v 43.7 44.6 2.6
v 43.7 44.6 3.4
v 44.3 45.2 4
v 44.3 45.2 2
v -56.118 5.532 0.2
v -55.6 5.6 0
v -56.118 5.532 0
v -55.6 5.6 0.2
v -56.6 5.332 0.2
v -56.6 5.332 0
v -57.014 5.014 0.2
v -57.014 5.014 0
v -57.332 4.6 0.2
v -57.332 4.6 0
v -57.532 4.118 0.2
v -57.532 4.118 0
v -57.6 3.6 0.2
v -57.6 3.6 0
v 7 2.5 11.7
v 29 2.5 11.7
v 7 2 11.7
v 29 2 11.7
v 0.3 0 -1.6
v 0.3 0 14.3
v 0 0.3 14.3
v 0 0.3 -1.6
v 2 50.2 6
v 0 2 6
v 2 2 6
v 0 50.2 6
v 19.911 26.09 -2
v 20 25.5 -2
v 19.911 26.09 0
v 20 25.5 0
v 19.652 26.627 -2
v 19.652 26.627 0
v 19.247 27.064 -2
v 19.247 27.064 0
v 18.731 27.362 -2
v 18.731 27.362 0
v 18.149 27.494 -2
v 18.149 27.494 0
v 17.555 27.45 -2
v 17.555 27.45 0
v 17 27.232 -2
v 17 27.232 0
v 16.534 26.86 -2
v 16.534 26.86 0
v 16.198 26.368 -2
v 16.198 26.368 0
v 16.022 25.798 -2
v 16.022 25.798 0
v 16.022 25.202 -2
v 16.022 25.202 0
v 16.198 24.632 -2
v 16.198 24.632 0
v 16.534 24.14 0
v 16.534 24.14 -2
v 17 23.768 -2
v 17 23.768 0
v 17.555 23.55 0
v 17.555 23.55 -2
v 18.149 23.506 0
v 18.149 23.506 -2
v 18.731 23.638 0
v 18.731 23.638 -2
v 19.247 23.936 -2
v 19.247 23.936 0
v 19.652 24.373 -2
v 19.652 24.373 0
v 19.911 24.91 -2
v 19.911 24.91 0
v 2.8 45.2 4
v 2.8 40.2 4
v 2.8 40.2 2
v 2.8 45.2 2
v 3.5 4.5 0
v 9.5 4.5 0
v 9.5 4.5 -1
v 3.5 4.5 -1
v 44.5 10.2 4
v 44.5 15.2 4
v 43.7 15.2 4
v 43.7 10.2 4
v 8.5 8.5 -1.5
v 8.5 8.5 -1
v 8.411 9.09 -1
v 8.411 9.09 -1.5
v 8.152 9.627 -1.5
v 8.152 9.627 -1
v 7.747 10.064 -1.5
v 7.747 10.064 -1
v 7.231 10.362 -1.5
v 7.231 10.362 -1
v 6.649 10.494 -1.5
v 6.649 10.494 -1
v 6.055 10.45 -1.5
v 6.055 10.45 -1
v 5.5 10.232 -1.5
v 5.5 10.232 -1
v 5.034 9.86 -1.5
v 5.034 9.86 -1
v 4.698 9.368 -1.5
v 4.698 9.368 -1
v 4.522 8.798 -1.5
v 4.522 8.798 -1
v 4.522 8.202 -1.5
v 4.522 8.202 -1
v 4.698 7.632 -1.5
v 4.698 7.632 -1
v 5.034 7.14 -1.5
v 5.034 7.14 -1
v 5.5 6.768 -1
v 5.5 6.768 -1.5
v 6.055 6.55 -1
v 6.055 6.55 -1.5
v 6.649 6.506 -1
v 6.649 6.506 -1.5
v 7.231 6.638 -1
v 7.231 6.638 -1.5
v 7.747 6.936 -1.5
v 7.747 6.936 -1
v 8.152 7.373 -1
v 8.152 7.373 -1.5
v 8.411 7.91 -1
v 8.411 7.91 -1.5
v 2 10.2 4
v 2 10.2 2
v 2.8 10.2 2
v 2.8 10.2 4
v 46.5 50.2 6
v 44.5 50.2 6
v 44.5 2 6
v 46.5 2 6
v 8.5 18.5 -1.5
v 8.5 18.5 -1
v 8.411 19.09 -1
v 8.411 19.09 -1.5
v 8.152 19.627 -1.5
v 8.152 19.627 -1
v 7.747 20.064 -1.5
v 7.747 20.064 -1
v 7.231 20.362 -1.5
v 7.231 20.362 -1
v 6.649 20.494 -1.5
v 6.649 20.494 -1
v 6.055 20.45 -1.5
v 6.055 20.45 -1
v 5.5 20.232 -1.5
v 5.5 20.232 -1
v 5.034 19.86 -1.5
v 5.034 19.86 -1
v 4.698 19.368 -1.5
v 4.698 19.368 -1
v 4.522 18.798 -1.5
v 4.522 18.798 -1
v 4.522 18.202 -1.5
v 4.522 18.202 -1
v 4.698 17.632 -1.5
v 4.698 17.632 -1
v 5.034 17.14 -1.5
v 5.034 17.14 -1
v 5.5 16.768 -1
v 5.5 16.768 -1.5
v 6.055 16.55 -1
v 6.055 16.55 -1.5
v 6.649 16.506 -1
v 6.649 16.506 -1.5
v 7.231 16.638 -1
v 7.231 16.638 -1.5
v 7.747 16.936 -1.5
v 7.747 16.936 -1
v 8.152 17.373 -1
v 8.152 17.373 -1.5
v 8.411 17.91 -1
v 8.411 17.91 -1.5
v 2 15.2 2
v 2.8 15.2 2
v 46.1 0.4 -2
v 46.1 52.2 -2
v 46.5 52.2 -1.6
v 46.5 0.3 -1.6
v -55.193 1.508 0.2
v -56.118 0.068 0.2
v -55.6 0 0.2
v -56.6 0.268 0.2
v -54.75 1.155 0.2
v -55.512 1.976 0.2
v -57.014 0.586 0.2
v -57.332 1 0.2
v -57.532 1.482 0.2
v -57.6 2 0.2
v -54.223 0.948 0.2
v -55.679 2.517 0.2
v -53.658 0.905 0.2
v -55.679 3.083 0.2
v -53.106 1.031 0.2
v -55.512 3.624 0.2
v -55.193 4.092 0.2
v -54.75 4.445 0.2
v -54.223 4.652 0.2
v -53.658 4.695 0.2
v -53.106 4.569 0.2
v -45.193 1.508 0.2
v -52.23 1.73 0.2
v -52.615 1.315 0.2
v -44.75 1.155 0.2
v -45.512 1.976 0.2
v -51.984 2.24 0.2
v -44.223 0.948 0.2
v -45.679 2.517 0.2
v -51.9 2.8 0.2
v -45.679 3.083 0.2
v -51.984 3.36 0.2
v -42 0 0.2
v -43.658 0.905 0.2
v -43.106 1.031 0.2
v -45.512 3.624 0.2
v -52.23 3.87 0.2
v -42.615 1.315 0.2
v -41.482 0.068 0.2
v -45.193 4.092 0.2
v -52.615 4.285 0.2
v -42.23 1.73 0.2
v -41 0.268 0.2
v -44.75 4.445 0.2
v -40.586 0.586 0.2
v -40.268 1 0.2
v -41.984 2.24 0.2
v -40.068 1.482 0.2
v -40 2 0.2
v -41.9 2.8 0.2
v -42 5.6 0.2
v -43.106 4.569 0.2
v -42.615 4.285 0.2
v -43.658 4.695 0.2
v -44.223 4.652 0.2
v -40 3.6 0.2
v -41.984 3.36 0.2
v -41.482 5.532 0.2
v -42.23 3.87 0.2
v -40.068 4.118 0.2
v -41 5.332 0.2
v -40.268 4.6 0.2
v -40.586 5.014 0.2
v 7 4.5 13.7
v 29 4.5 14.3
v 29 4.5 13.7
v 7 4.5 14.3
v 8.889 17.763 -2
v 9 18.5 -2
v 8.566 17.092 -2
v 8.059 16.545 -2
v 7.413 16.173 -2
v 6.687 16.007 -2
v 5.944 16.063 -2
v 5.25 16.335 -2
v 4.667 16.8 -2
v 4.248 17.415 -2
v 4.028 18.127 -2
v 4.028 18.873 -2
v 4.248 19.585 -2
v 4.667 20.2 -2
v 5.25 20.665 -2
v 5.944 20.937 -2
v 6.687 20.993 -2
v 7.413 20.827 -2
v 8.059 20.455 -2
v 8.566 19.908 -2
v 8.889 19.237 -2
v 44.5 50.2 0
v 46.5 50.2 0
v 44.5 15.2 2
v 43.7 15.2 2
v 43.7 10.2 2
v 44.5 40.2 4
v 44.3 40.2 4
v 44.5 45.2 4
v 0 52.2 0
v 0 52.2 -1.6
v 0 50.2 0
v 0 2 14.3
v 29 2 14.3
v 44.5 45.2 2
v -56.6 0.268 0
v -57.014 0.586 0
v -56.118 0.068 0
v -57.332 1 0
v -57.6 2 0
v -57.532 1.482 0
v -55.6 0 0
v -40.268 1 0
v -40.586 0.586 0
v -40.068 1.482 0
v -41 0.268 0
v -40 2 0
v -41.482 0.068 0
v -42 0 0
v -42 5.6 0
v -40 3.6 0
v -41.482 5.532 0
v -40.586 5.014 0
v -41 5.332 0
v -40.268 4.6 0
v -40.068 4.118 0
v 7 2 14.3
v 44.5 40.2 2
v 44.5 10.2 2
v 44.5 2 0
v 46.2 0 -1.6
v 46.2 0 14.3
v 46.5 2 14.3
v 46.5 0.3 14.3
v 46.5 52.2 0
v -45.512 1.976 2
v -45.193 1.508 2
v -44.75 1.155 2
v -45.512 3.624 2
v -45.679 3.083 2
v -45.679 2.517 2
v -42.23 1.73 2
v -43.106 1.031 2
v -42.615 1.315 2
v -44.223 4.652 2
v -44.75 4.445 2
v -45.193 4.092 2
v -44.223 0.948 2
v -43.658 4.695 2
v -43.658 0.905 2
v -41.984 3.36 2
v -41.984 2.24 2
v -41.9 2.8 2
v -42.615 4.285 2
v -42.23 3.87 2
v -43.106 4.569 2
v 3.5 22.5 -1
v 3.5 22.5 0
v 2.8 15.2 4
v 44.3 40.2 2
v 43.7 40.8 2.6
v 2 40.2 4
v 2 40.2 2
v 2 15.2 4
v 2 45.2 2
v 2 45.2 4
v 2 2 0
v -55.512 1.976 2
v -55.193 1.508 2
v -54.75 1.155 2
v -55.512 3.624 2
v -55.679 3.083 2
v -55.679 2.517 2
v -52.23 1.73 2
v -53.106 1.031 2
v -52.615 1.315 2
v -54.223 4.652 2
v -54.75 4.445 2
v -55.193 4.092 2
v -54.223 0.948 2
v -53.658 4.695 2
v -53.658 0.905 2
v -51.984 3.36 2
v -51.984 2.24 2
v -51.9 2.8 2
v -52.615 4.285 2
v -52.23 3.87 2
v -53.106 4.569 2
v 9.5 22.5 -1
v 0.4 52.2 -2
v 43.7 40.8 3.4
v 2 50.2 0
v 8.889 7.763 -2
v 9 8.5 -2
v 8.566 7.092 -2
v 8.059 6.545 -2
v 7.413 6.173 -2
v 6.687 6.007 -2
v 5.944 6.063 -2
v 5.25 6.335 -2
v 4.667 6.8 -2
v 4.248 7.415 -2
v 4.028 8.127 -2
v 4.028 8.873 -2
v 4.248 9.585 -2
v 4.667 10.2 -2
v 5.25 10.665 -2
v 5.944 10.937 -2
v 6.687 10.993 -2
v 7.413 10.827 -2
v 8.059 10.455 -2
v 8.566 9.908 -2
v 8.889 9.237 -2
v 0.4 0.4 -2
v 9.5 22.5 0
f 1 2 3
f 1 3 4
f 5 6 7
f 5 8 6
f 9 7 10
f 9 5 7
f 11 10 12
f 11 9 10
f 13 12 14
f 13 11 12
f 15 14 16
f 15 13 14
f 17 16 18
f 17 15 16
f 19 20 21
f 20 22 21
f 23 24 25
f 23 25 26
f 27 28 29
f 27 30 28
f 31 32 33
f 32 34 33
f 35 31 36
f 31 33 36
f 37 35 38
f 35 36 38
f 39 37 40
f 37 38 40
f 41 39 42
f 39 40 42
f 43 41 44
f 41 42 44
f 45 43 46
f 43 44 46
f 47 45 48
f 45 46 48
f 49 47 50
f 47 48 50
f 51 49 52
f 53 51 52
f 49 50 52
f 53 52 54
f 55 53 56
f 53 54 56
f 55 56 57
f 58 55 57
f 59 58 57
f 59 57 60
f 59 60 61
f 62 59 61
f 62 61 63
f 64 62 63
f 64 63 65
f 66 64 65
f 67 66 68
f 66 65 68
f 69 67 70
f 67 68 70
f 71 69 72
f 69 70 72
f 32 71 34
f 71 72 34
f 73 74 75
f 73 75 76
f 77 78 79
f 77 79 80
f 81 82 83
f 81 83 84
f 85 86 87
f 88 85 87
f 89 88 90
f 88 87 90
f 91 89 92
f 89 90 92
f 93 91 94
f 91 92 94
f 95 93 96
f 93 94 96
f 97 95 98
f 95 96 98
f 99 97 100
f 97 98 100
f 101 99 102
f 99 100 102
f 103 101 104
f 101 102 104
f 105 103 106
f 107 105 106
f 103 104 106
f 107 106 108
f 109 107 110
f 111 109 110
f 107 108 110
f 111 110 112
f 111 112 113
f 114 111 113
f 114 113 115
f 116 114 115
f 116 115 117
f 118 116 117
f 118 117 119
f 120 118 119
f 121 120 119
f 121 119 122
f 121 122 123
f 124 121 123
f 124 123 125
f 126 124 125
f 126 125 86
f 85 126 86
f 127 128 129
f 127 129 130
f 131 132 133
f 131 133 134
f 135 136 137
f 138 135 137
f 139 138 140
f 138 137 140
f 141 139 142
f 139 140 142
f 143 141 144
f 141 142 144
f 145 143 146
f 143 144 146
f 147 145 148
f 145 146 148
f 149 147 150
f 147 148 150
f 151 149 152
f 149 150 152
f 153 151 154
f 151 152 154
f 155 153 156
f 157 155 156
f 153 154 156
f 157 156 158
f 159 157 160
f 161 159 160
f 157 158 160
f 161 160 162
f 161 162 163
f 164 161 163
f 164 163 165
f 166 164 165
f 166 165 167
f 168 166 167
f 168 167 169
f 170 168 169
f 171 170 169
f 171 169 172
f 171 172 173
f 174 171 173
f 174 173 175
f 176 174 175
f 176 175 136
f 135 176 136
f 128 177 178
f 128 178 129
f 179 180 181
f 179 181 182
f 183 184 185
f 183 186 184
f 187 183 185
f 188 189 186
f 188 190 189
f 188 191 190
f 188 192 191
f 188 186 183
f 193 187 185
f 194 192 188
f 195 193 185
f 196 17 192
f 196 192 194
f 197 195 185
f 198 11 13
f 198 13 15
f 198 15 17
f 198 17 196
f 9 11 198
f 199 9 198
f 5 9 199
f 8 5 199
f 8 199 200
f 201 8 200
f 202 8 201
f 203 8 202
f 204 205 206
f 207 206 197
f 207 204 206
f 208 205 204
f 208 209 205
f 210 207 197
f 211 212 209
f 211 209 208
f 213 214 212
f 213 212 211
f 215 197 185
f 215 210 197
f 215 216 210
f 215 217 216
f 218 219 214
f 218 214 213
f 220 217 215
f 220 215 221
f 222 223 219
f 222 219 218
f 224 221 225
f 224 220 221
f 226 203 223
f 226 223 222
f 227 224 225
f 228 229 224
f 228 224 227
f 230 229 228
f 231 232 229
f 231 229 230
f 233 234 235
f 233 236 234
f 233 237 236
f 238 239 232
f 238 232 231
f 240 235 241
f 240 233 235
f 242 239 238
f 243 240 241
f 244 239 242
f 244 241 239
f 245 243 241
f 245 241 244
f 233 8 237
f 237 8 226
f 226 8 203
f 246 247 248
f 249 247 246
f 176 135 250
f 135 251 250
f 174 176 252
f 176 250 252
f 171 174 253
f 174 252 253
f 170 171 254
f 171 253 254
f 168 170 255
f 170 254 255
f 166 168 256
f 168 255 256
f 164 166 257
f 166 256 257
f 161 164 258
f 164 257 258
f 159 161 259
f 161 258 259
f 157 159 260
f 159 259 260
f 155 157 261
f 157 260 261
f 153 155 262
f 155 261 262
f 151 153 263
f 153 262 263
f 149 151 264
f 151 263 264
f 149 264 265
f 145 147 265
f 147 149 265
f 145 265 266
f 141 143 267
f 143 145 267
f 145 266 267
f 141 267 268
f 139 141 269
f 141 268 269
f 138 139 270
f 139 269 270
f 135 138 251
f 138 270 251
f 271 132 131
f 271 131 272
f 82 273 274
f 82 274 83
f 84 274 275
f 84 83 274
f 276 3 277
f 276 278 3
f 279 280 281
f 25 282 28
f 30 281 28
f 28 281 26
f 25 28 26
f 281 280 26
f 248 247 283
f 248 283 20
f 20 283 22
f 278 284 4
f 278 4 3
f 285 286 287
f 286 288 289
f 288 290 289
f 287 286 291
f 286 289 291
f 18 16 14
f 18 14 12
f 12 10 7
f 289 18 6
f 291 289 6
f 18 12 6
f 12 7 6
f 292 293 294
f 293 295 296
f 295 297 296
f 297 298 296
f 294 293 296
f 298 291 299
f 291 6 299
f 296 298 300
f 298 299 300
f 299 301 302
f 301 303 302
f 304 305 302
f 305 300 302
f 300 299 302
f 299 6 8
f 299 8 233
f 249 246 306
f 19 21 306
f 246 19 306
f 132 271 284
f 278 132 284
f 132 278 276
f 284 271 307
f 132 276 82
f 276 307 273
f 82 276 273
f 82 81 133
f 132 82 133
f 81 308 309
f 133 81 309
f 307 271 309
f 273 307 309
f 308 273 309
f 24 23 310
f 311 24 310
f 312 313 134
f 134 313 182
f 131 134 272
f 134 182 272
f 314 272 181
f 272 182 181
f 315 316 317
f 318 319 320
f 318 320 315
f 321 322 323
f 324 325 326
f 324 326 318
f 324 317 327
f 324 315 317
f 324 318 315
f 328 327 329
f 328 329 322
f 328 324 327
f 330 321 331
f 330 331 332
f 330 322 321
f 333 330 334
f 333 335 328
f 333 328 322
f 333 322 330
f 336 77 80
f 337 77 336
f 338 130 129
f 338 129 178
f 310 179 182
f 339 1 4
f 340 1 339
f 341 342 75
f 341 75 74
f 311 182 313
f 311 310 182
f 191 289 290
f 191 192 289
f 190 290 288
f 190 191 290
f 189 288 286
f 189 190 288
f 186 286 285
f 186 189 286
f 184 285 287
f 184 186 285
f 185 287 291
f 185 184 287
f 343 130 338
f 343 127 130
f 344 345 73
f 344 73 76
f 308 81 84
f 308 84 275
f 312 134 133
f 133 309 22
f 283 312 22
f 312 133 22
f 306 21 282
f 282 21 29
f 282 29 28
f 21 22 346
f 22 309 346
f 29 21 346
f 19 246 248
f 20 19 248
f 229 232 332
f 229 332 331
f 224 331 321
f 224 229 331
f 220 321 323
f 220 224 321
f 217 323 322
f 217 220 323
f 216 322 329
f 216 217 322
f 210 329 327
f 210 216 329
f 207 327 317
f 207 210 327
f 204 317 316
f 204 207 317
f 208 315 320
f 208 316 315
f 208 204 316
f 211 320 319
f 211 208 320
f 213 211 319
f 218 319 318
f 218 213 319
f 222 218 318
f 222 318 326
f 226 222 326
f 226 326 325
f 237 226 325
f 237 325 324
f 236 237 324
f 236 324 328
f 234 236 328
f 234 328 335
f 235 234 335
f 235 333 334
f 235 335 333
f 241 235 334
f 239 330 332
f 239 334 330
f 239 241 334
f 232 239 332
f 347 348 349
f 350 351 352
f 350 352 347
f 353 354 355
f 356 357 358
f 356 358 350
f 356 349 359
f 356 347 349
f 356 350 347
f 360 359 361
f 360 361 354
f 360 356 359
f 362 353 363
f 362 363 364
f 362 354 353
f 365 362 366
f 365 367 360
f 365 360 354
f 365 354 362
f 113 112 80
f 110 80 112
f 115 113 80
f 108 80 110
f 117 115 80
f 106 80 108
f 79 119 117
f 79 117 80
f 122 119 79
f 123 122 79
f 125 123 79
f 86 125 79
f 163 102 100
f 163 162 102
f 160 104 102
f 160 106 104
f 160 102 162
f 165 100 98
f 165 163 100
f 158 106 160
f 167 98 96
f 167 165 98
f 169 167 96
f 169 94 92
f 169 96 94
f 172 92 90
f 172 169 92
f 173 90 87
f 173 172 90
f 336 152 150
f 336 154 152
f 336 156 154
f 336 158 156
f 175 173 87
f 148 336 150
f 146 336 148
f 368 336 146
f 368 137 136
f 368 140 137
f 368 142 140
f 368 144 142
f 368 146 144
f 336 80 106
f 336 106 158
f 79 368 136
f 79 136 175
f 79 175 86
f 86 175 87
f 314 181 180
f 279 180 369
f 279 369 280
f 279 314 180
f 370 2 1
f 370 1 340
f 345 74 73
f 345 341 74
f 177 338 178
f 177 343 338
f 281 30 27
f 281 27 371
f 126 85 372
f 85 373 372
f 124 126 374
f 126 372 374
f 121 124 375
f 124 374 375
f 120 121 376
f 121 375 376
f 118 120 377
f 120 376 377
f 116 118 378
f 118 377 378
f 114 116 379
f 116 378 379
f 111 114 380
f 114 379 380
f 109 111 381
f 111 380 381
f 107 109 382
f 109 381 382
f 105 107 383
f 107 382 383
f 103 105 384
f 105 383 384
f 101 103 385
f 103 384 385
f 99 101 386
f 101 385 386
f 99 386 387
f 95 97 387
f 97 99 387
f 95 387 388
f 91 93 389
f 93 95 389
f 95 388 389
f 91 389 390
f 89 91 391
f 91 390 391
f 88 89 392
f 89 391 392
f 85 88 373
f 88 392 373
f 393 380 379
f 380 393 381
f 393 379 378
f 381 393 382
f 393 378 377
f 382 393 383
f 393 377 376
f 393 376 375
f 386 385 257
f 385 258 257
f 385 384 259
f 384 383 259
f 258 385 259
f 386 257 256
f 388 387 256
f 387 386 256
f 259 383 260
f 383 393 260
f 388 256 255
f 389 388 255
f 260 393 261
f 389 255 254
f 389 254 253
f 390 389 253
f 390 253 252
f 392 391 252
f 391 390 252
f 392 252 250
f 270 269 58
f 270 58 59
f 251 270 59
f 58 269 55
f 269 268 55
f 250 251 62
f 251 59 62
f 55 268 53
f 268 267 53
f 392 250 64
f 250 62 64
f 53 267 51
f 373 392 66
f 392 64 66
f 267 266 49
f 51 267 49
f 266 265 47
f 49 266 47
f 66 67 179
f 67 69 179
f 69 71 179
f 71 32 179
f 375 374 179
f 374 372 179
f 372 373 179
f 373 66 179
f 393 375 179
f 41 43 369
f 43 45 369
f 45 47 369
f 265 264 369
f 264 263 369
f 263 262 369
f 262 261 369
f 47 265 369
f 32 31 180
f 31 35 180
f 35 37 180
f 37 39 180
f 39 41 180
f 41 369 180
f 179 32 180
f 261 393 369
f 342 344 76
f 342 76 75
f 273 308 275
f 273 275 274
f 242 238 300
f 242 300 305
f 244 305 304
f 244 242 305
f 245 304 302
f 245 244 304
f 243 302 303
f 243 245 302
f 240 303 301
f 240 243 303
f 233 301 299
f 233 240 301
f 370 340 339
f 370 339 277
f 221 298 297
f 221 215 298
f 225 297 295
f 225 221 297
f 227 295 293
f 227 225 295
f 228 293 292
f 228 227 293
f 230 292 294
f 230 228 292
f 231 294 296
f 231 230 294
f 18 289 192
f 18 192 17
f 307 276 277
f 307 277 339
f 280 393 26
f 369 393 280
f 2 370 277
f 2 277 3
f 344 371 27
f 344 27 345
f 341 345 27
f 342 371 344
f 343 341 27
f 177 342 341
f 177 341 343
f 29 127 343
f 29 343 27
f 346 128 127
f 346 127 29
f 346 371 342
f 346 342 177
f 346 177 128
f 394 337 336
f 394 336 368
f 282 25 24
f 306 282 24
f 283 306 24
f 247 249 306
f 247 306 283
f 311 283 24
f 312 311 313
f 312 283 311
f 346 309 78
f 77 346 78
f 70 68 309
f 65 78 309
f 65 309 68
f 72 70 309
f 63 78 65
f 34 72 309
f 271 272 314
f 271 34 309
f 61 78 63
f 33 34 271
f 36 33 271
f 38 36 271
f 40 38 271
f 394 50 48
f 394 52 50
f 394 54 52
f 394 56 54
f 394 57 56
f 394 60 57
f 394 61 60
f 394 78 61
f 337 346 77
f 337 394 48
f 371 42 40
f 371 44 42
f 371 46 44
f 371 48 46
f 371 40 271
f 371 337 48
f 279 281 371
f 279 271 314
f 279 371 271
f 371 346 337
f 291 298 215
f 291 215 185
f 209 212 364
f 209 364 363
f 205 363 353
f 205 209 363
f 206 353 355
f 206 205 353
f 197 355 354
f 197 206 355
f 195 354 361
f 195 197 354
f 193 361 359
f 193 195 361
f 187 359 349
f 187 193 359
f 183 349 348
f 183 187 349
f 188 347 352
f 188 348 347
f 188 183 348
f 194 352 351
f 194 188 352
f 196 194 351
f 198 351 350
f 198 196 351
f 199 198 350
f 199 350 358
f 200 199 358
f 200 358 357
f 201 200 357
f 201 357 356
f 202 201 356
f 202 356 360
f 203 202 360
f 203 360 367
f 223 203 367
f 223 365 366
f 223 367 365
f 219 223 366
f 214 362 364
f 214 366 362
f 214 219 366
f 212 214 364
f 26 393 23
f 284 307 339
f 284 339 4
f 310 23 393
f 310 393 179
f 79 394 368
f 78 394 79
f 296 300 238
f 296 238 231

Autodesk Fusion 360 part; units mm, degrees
sketch "Sketch1" plane through (0, 0, 0) normal (0, 0, 1) x (1, 0, 0)
  line L0 (0, 0) -> (46.5, 0)
  line L1 (46.5, 0) -> (46.5, 52.2)
  line L2 (46.5, 52.2) -> (0, 52.2)
  line L3 (0, 52.2) -> (0, 0)
  line L4 (46.5, 2) -> (0, 2)
  line L5 (44.5, 52.2) -> (44.5, 2)
  line L6 (2, 52.2) -> (2, 2)
  circle A0 centre (6.5, 8.5) radius 2
  circle A1 centre (6.5, 18.5) radius 2
  line L7 (3.5, 22.5) -> (9.5, 22.5)
  line L8 (9.5, 22.5) -> (9.5, 4.5)
  line L9 (9.5, 4.5) -> (3.5, 4.5)
  line L10 (3.5, 4.5) -> (3.5, 22.5)
  circle A2 centre (18, 25.5) radius 2
  dimension "d1" = 46.5
  dimension "d2" = 52.2
  dimension "d3" = 2
  dimension "d4" = 2
  dimension "d5" = 2
  dimension "d55" = 6.5
  dimension "d56" = 6.5
  dimension "d57" = 4
  dimension "d58" = 4
  dimension "d59" = 6.5
  dimension "d60" = 10
  dimension "d61" = 4
  dimension "d62" = 4
  dimension "d63" = 3
  dimension "d64" = 3
  dimension "d70" = 23.5
  dimension "d72" = 18
  dimension "d73" = 4
extrude "Extrude1" add sketch "Sketch1" against normal blind 2 contours L0 L1 L3 L4 | L2 L3 L4 L6 | L1 L2 L4 L5 | L2 L4 L5 L6 | A0 | A1 | L7 L8 L9 L10 | A2 makes body 1
extrude "Extrude2" add sketch "Sketch1" along normal blind 6 contours L2 L3 L4 L6 | L1 L2 L4 L5 bodies 1
extrude "Extrude3" add sketch "Sketch1" along normal blind 14.3 contours L0 L1 L3 L4 bodies 1
sketch "Sketch2" plane through (0, 0, 0) normal (-1, 0, 0) x (0, -1, 0)
  line L0 (-52.2, 6) -> (-52.2, -2)
  line L1 (-52.2, -2) -> (0, -2)
  line L2 (0, -2) -> (0, 14.3)
  line L3 (0, 14.3) -> (-2, 14.3)
  line L4 (-2, 14.3) -> (-2, 6)
  line L5 (-2, 6) -> (-52.2, 6)
  line L6 (-52.2, 6) -> (-50.2, 6)
  line L7 (-50.2, 6) -> (-50.2, 0)
  line L8 (-50.2, 0) -> (-52.2, 0)
  line L9 (-52.2, 0) -> (-52.2, 6)
  line L10 (-52.2, 0) -> (0, 0)
  dimension "d12" = 2
extrude "Extrude4" cut sketch "Sketch2" against normal up to surface (46.5 mm away) contours L0 L5 L6 L7 L8 L9 L10 bodies 1
sketch "Sketch3" plane through (44.5, 0, 0) normal (-1, 0, 0) x (0, -1, 0)
  line L0 (-50.2, 6) -> (-50.2, 0)
  line L1 (-50.2, 0) -> (-2, 0)
  line L2 (-2, 0) -> (-2, 6)
  line L3 (-2, 6) -> (-50.2, 6)
  line L4 (-45.2, 4) -> (-40.2, 4)
  line L5 (-40.2, 4) -> (-40.2, 2)
  line L6 (-40.2, 2) -> (-45.2, 2)
  line L7 (-45.2, 2) -> (-45.2, 4)
  dimension "d15" = 2
  dimension "d16" = 5
  dimension "d17" = 2
  dimension "d18" = 5
extrude "Extrude5" add sketch "Sketch3" along normal blind 0.8 contours L4 L5 L6 L7 bodies 1
pattern_linear "R-Pattern1" count 2 spacing 30 along (0, -1, 0) of "Extrude5"
ref_plane "WorkPlane1" through (23.25, 27.1, 3) normal (-1, 0, 0) x (0, -1, 0)
mirror "Mirror1" about plane through (23.25, 27.1, 3) normal (-1, 0, 0) of "Extrude5", "R-Pattern1"
chamfer "Chamfer1" distance 0.6 angle 45 4 faces at (43.7, 43.5333, 3.3333) (43.7, 43.5333, 3.3333) (43.7, 43.5333, 3.3333) (43.7, 43.5333, 3.3333) on bodies 1
sketch "Sketch4" plane through (0, 2, 0) normal (0, 1, 0) x (-1, 0, 0)
  line L0 (-46.5, 6) -> (-44.5, 6)
  line L1 (-44.5, 6) -> (-44.5, 0)
  line L2 (-44.5, 0) -> (-2, 0)
  line L3 (-2, 0) -> (-2, 6)
  line L4 (-2, 6) -> (0, 6)
  line L5 (0, 6) -> (0, 14.3)
  line L6 (0, 14.3) -> (-46.5, 14.3)
  line L7 (-46.5, 14.3) -> (-46.5, 6)
  line L8 (-7, 14.3) -> (-29, 14.3)
  line L9 (-29, 14.3) -> (-29, 11.7)
  line L10 (-29, 11.7) -> (-7, 11.7)
  line L11 (-7, 11.7) -> (-7, 14.3)
  dimension "d28" = 2.6
  dimension "d29" = 22
  dimension "d30" = 7
extrude "Extrude6" add sketch "Sketch4" along normal blind 2.5 contours L6 L8 L9 L10 L11 bodies 1
extrude "Extrude8" cut sketch "Sketch1" against normal through all contours A2 bodies 1
chamfer "Chamfer2" distance 0.4 angle 45 3 edges at (46.5, 26.1, -2) (23.25, 0, -2) (0, 26.1, -2) on bodies 1
chamfer "Chamfer2" distance 0.3 angle 45 2 edges at (46.5, 0, 6.15) (0, 0, 6.15) on bodies 1
chamfer "Chamfer2" distance 2 angle 45 1 edges at (18, 4.5, 11.7) on bodies 1
extrude "Extrude9" cut sketch "Sketch1" against normal blind 1 contours L7 L8 L9 L10 bodies 1
extrude "Extrude10" cut sketch "Sketch1" against normal up to surface (2 mm away) contours A0 | A1 bodies 1
chamfer "Chamfer3" distance 0.5 angle 45 2 edges at (4.6353, 17.7768, -2) (4.6353, 7.7768, -2) on bodies 1
sketch "Sketch5" plane through (0, 0, 0) normal (0, 0, 1) x (1, 0, 0)
  line L0 (-57.6, 5.6) -> (-40, 5.6)
  line L1 (-40, 5.6) -> (-40, 0)
  line L2 (-40, 0) -> (-57.6, 0)
  line L3 (-57.6, 0) -> (-57.6, 5.6)
  line L4 (0, 52.2) -> (0, 0)
  line L5 (0, 0) -> (46.5, 0)
  circle A0 centre (-53.8, 2.8) radius 1.9
  circle A1 centre (-43.8, 2.8) radius 1.9
  dimension "d74" = 17.6
  dimension "d75" = 5.6
  dimension "d76" = 40
  dimension "d77" = 3.8
  dimension "d78" = 3.8
  dimension "d79" = 2.8
  dimension "d80" = 2.8
  dimension "d81" = 10
  dimension "d82" = 3.8
extrude "Extrude11" add sketch "Sketch5" along normal blind 2 separate body contours A0 | A1 makes body 2 at (-51.9024, 2.7053, 1.3333) makes body 3 at (-41.9024, 2.7053, 1.3333)
extrude "Extrude12" add sketch "Sketch5" along normal blind 0.2 bodies 2 3
fillet "Fillet1" radius 2 4 edges at (-57.6, 0, 0.1) (-57.6, 5.6, 0.1) (-40, 5.6, 0.1) (-40, 0, 0.1) on bodies 2
equation "d80 = d79"
